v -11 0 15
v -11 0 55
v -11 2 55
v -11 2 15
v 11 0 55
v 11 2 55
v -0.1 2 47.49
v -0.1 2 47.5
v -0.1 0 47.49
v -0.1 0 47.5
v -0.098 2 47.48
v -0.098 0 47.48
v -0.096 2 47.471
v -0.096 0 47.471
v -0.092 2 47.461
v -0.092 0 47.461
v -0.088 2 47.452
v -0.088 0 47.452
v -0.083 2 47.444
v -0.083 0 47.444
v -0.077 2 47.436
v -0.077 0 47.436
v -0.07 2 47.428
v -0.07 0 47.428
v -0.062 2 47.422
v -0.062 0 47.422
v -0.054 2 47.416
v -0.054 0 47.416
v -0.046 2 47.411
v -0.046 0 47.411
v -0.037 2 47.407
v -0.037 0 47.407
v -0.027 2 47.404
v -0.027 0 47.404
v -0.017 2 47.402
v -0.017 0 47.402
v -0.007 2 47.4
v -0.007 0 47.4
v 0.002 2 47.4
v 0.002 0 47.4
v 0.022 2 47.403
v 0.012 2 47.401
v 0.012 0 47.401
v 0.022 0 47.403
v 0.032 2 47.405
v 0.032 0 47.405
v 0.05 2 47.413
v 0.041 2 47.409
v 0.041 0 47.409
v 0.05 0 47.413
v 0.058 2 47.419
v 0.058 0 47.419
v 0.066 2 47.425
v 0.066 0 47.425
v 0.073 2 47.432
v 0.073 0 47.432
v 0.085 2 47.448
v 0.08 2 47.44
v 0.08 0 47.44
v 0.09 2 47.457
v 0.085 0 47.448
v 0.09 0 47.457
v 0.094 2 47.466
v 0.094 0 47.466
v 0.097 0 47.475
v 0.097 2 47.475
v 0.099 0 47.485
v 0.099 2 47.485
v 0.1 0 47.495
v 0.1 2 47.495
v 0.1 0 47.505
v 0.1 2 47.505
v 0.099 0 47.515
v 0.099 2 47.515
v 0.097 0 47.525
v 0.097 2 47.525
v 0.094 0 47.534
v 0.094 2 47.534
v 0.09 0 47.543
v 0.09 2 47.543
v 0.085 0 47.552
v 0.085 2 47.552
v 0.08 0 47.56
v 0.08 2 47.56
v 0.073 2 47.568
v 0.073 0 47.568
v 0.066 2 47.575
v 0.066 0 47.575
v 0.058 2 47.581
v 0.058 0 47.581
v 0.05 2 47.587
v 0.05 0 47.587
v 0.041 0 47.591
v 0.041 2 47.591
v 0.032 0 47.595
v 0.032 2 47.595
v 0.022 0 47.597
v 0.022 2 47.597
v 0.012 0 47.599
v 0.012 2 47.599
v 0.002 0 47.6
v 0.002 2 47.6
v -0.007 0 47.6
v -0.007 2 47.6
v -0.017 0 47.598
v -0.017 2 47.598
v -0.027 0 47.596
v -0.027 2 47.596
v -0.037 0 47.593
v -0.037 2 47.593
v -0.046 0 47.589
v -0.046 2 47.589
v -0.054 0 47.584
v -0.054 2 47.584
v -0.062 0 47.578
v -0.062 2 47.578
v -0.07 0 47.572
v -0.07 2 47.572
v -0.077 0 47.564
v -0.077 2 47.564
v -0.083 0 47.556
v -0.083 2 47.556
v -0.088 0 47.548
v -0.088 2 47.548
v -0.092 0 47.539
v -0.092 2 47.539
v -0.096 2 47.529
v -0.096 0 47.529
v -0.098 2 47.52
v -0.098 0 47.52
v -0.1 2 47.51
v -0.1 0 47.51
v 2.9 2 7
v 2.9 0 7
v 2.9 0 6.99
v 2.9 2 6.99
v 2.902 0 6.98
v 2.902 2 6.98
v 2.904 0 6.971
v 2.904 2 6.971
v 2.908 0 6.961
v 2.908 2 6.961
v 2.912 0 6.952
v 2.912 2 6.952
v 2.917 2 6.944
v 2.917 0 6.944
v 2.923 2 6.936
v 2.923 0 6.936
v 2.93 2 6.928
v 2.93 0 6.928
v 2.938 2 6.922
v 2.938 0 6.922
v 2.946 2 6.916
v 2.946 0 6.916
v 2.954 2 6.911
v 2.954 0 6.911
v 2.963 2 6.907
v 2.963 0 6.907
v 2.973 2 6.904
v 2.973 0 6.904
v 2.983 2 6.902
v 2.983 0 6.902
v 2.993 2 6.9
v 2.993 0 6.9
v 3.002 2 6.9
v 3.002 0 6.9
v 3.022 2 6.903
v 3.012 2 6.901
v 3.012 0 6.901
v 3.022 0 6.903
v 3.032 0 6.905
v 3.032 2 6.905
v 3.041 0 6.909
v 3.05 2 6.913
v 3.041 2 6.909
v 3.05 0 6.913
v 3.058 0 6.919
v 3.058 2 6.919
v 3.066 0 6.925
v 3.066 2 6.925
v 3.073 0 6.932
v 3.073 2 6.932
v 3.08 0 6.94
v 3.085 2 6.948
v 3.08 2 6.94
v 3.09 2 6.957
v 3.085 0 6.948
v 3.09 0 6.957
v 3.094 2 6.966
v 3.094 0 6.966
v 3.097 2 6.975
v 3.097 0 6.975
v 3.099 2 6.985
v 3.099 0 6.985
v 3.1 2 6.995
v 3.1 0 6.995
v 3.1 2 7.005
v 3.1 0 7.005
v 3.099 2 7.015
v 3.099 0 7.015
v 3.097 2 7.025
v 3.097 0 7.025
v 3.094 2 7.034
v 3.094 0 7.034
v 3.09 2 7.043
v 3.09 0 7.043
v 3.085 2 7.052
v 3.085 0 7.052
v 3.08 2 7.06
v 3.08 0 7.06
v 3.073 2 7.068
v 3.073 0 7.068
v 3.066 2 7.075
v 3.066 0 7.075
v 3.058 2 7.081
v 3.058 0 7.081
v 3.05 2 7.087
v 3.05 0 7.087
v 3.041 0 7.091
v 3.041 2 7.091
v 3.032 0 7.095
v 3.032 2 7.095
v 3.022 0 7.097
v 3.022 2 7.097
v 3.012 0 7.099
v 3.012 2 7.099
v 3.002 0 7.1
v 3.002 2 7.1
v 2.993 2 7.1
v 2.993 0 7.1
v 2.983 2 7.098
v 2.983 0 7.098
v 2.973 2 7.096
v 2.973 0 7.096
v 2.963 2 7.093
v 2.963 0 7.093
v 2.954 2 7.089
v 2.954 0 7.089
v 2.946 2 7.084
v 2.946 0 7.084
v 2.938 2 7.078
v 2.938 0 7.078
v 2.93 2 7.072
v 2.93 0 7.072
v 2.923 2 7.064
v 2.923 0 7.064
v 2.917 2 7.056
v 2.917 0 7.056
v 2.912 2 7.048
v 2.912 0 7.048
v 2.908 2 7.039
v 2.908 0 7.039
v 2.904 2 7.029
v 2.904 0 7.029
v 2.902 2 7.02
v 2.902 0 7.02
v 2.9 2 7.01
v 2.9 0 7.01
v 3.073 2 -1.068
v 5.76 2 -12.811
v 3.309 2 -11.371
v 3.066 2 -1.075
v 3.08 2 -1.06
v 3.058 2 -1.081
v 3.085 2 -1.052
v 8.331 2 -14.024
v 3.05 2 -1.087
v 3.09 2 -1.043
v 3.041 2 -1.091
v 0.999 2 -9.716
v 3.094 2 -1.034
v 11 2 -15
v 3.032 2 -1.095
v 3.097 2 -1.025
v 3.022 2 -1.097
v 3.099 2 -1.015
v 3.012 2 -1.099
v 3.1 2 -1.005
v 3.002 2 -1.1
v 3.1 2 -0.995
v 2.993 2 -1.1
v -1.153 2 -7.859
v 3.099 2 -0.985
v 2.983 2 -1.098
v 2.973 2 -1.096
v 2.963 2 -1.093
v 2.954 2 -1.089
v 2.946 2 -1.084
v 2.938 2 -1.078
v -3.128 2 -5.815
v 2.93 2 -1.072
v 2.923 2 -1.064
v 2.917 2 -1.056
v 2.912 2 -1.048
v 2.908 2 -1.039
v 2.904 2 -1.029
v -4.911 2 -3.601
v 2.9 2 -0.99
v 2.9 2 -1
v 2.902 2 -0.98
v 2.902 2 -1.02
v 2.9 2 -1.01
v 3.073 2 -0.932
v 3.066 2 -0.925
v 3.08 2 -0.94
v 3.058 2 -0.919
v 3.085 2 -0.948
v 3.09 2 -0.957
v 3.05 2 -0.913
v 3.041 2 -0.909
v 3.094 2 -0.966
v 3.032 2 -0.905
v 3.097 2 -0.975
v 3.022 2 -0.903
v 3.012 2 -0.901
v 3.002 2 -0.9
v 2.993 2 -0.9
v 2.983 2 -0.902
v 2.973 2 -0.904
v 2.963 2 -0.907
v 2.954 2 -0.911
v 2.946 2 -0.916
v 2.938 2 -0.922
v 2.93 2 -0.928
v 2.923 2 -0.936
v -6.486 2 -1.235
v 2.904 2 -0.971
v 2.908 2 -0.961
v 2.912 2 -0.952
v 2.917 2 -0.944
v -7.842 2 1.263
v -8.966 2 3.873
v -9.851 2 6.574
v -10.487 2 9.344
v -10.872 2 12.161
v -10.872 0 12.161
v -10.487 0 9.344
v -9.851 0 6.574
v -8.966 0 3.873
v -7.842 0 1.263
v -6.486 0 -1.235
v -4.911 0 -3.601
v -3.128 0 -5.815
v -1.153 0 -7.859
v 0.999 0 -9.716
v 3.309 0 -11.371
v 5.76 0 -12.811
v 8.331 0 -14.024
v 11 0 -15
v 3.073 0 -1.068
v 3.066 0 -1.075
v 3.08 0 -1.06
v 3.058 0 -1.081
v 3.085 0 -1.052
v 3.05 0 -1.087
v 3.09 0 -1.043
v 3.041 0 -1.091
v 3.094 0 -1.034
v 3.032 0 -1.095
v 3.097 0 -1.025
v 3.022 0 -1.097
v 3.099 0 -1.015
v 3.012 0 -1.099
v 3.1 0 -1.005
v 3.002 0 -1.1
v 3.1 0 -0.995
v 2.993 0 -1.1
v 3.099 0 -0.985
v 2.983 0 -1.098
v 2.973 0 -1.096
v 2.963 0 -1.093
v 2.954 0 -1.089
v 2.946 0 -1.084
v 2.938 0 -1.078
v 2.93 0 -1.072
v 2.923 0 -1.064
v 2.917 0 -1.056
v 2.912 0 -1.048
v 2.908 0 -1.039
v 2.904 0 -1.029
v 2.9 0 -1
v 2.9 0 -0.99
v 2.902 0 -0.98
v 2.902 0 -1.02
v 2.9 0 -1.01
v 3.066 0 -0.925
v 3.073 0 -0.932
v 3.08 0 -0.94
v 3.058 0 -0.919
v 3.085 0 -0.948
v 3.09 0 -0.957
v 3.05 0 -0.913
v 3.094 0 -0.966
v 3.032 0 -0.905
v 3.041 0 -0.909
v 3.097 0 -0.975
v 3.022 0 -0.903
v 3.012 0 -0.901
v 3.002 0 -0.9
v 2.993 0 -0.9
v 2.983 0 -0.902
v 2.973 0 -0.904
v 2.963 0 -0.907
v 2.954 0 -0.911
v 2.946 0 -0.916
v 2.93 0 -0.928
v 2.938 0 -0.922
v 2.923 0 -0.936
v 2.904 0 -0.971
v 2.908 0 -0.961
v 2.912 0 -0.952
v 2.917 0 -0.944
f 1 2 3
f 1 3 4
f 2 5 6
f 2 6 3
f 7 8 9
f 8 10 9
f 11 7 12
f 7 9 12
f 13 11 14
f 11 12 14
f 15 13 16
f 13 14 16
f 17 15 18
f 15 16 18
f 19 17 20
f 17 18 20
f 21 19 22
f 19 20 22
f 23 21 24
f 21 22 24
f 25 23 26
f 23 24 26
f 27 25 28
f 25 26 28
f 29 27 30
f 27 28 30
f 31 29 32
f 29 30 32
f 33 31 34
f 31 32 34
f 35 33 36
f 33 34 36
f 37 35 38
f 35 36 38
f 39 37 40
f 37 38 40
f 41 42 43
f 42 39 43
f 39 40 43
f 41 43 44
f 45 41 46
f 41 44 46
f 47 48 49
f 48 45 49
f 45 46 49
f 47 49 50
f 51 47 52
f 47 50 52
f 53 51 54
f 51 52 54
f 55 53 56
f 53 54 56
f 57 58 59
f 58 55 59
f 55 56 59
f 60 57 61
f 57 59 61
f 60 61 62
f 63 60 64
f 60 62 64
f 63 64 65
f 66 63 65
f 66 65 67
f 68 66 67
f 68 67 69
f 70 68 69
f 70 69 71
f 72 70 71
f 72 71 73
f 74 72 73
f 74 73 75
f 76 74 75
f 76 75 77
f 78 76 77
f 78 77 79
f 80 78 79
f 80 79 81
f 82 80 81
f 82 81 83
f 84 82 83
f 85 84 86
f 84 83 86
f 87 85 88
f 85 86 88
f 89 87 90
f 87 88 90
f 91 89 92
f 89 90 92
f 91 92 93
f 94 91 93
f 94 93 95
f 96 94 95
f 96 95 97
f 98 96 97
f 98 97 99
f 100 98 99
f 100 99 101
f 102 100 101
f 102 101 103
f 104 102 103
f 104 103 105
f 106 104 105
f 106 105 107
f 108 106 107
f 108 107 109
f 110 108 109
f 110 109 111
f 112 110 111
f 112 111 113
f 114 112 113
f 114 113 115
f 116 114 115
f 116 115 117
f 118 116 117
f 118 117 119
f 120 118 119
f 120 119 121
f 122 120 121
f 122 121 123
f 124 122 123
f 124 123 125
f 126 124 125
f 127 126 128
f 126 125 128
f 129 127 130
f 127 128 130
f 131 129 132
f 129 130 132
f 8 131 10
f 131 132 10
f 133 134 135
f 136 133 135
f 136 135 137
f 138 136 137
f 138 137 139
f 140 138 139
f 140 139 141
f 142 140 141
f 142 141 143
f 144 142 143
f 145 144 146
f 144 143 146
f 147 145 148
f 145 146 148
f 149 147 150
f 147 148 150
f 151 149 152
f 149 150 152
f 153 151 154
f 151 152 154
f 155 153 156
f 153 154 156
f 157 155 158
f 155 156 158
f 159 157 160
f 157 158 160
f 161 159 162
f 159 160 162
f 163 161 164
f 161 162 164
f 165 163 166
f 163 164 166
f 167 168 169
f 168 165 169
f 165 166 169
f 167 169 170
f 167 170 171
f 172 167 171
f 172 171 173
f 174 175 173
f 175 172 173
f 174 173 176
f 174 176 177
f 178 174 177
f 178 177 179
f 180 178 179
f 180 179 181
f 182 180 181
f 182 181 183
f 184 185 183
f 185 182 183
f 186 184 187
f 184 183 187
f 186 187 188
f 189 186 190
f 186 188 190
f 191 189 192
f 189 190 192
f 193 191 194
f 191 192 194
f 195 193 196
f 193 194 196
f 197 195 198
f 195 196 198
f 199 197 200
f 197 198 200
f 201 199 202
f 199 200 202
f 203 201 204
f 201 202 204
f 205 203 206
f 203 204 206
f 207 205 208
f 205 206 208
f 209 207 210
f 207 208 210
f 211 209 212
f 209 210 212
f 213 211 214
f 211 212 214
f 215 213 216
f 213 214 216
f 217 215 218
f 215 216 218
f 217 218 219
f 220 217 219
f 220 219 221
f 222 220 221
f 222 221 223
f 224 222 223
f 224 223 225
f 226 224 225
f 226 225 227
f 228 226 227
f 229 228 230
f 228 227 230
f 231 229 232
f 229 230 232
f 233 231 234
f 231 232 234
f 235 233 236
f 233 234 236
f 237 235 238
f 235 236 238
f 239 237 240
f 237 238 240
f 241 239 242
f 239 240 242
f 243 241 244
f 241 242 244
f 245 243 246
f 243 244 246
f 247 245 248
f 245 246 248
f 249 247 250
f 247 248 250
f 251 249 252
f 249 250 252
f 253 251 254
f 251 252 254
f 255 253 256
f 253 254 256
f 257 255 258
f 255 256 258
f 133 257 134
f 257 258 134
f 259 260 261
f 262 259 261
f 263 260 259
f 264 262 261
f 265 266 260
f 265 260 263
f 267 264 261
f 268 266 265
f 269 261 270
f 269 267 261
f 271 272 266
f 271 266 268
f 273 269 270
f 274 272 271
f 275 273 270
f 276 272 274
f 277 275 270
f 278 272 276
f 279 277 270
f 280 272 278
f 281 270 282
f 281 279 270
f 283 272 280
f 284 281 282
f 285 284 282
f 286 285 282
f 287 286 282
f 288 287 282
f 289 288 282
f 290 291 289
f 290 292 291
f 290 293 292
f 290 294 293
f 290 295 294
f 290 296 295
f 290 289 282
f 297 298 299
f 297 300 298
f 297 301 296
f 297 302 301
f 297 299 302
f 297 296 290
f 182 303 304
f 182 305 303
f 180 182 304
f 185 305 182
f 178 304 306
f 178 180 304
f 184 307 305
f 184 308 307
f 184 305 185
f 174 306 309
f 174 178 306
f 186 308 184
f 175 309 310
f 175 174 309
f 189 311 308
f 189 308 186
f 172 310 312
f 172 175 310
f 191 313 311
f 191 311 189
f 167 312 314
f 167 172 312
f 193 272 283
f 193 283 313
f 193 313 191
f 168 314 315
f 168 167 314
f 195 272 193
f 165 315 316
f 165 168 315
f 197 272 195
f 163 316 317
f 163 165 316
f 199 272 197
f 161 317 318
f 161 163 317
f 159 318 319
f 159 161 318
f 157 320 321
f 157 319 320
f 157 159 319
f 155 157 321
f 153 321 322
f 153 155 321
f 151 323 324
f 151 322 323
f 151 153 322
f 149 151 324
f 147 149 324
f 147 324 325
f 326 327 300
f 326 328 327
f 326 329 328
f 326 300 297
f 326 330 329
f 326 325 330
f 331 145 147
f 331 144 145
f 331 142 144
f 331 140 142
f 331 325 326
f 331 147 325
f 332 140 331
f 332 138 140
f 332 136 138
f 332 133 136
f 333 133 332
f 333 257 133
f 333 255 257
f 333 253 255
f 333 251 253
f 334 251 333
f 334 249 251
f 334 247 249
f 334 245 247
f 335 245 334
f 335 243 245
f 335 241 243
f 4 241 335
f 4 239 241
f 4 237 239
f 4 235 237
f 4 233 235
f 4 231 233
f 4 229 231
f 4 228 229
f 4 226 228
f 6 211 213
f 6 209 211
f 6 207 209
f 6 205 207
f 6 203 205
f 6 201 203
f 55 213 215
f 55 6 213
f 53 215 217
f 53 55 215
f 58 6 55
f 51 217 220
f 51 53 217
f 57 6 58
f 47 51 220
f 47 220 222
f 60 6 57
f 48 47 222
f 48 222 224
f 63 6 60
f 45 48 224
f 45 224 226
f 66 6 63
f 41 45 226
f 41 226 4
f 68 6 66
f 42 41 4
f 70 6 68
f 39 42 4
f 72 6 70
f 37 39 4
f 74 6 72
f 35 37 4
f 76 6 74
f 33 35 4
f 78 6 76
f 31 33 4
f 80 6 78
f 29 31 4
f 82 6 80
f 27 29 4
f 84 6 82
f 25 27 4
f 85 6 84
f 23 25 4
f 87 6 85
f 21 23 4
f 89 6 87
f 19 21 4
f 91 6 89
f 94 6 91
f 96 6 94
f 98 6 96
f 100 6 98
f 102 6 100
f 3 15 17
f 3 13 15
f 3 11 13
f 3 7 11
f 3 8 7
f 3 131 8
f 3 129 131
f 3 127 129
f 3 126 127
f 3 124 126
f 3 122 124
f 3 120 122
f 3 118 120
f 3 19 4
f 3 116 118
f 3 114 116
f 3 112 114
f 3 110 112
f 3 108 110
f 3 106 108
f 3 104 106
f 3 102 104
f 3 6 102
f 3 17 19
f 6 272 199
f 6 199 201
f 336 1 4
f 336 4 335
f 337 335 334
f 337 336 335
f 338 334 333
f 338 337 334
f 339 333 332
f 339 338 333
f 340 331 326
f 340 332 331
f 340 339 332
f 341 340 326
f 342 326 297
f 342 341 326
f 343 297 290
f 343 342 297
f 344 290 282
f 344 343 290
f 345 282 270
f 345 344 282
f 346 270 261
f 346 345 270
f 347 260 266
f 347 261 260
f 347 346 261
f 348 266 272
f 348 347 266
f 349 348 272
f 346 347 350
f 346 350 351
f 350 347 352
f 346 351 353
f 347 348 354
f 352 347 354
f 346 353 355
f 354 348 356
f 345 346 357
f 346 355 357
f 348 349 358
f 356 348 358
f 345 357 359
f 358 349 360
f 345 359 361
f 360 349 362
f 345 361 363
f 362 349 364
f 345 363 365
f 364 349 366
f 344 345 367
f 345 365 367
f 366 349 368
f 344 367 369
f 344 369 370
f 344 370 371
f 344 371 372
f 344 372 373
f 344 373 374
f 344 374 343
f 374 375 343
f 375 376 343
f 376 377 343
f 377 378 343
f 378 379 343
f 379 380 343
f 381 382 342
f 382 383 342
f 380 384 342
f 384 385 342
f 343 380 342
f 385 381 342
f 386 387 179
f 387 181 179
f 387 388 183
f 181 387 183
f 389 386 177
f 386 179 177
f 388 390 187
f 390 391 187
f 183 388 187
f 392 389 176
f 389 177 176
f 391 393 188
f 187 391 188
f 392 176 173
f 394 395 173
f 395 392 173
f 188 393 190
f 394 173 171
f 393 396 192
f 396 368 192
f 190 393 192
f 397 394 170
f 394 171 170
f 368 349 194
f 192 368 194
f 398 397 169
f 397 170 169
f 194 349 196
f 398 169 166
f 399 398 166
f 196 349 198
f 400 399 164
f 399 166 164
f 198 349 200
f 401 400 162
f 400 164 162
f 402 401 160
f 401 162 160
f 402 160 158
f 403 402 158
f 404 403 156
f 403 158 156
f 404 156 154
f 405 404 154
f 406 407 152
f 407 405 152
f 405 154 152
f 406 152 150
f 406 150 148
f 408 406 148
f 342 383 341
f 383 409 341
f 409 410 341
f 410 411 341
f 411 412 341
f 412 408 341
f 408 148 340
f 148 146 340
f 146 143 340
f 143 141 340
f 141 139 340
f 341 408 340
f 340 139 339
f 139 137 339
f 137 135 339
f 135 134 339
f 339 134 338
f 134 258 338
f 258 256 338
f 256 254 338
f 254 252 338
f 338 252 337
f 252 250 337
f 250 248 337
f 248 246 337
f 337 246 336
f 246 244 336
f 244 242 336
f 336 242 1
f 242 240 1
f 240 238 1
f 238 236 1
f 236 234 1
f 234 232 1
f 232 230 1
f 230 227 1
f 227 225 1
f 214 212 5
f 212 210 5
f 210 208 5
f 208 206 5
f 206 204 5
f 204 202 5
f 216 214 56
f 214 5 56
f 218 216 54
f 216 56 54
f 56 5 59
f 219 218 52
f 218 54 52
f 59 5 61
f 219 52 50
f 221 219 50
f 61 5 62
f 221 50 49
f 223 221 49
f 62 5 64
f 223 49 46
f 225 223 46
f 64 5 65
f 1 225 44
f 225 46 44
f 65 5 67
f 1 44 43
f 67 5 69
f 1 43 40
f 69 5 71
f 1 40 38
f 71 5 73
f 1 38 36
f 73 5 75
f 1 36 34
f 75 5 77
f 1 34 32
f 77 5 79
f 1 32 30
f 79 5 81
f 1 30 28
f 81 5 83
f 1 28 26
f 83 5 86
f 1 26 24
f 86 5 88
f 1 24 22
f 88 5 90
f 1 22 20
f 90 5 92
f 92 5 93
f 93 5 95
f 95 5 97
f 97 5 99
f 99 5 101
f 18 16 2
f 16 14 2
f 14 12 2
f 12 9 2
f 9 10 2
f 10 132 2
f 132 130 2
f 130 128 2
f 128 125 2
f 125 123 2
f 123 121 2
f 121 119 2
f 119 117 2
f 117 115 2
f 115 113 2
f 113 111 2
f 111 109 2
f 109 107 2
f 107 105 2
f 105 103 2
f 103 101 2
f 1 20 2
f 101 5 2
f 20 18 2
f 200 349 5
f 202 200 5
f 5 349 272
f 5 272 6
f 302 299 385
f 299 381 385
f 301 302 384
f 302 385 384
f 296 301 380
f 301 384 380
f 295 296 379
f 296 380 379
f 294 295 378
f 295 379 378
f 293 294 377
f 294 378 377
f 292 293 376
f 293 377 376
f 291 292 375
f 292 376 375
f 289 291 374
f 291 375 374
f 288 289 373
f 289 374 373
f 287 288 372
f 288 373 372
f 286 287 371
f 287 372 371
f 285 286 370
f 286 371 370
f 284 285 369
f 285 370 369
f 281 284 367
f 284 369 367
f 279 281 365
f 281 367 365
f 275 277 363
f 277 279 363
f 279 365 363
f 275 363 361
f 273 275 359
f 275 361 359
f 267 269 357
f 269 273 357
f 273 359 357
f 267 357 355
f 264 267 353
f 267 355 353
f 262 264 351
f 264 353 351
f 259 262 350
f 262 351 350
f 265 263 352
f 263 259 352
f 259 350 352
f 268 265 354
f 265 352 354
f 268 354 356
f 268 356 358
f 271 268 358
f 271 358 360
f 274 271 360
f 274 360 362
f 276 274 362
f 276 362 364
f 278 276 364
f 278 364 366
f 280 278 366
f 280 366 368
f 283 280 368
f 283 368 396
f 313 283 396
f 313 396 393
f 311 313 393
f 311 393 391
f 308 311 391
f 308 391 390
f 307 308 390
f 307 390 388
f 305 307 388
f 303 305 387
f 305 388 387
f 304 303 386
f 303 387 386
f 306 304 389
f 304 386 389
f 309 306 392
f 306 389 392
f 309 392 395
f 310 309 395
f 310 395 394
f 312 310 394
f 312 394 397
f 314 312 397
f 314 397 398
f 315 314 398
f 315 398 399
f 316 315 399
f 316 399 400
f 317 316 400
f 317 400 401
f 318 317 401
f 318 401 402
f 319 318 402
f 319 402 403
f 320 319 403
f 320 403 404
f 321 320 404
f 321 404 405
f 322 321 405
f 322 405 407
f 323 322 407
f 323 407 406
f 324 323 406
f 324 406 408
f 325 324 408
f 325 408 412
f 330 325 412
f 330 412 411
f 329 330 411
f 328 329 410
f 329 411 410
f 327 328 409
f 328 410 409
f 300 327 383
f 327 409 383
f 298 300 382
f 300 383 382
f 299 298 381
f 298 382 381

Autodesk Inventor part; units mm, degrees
ref_plane "YZ Plane" through (0, 0, 0) normal (1, 0, 0) x (0, 1, 0)
ref_plane "XZ Plane" through (0, 0, 0) normal (0, 1, 0) x (-1, 0, 0)
ref_plane "XY Plane" through (0, 0, 0) normal (0, 0, 1) x (1, 0, 0)
sketch "Sketch1" plane through (0, 0, 0) normal (0, 1, 0) x (-1, 0, 0)
  line L0 (-11, -15) -> (-11, 15)
  line L1 (-11, 15) -> (11, 15)
  arc A0 (-11, -15) -> (11, 15) centre (-20.4545, 15) ccw
  line L2 (11, 15) -> (-11, 15)
  line L3 (-11, 15) -> (-11, 40)
  line L4 (-11, 40) -> (11, 40)
  line L5 (11, 40) -> (11, 15)
  line L6 (11, 40) -> (-11, 40)
  line L7 (-11, 40) -> (-11, 55)
  line L8 (-11, 55) -> (11, 55)
  line L9 (11, 55) -> (11, 40)
  circle A1 centre (0, 47.5) radius 0.1
  line L10 (-11, 15) -> (-3, 15)
  circle A2 centre (-3, 7) radius 0.1
  circle A3 centre (-3, -1) radius 0.1
  dimension "d0" = 22
  dimension "d1" = 30
  dimension "d2" = 25
  dimension "d3" = 15
  dimension "d4" = 0.2
  dimension "d5" = 8
  dimension "d8" = 0.2
  dimension "d10" = 0.2
extrude "Extrusion1" add sketch "Sketch1" along normal blind 2
properties part number "drzak_buzirka1"
